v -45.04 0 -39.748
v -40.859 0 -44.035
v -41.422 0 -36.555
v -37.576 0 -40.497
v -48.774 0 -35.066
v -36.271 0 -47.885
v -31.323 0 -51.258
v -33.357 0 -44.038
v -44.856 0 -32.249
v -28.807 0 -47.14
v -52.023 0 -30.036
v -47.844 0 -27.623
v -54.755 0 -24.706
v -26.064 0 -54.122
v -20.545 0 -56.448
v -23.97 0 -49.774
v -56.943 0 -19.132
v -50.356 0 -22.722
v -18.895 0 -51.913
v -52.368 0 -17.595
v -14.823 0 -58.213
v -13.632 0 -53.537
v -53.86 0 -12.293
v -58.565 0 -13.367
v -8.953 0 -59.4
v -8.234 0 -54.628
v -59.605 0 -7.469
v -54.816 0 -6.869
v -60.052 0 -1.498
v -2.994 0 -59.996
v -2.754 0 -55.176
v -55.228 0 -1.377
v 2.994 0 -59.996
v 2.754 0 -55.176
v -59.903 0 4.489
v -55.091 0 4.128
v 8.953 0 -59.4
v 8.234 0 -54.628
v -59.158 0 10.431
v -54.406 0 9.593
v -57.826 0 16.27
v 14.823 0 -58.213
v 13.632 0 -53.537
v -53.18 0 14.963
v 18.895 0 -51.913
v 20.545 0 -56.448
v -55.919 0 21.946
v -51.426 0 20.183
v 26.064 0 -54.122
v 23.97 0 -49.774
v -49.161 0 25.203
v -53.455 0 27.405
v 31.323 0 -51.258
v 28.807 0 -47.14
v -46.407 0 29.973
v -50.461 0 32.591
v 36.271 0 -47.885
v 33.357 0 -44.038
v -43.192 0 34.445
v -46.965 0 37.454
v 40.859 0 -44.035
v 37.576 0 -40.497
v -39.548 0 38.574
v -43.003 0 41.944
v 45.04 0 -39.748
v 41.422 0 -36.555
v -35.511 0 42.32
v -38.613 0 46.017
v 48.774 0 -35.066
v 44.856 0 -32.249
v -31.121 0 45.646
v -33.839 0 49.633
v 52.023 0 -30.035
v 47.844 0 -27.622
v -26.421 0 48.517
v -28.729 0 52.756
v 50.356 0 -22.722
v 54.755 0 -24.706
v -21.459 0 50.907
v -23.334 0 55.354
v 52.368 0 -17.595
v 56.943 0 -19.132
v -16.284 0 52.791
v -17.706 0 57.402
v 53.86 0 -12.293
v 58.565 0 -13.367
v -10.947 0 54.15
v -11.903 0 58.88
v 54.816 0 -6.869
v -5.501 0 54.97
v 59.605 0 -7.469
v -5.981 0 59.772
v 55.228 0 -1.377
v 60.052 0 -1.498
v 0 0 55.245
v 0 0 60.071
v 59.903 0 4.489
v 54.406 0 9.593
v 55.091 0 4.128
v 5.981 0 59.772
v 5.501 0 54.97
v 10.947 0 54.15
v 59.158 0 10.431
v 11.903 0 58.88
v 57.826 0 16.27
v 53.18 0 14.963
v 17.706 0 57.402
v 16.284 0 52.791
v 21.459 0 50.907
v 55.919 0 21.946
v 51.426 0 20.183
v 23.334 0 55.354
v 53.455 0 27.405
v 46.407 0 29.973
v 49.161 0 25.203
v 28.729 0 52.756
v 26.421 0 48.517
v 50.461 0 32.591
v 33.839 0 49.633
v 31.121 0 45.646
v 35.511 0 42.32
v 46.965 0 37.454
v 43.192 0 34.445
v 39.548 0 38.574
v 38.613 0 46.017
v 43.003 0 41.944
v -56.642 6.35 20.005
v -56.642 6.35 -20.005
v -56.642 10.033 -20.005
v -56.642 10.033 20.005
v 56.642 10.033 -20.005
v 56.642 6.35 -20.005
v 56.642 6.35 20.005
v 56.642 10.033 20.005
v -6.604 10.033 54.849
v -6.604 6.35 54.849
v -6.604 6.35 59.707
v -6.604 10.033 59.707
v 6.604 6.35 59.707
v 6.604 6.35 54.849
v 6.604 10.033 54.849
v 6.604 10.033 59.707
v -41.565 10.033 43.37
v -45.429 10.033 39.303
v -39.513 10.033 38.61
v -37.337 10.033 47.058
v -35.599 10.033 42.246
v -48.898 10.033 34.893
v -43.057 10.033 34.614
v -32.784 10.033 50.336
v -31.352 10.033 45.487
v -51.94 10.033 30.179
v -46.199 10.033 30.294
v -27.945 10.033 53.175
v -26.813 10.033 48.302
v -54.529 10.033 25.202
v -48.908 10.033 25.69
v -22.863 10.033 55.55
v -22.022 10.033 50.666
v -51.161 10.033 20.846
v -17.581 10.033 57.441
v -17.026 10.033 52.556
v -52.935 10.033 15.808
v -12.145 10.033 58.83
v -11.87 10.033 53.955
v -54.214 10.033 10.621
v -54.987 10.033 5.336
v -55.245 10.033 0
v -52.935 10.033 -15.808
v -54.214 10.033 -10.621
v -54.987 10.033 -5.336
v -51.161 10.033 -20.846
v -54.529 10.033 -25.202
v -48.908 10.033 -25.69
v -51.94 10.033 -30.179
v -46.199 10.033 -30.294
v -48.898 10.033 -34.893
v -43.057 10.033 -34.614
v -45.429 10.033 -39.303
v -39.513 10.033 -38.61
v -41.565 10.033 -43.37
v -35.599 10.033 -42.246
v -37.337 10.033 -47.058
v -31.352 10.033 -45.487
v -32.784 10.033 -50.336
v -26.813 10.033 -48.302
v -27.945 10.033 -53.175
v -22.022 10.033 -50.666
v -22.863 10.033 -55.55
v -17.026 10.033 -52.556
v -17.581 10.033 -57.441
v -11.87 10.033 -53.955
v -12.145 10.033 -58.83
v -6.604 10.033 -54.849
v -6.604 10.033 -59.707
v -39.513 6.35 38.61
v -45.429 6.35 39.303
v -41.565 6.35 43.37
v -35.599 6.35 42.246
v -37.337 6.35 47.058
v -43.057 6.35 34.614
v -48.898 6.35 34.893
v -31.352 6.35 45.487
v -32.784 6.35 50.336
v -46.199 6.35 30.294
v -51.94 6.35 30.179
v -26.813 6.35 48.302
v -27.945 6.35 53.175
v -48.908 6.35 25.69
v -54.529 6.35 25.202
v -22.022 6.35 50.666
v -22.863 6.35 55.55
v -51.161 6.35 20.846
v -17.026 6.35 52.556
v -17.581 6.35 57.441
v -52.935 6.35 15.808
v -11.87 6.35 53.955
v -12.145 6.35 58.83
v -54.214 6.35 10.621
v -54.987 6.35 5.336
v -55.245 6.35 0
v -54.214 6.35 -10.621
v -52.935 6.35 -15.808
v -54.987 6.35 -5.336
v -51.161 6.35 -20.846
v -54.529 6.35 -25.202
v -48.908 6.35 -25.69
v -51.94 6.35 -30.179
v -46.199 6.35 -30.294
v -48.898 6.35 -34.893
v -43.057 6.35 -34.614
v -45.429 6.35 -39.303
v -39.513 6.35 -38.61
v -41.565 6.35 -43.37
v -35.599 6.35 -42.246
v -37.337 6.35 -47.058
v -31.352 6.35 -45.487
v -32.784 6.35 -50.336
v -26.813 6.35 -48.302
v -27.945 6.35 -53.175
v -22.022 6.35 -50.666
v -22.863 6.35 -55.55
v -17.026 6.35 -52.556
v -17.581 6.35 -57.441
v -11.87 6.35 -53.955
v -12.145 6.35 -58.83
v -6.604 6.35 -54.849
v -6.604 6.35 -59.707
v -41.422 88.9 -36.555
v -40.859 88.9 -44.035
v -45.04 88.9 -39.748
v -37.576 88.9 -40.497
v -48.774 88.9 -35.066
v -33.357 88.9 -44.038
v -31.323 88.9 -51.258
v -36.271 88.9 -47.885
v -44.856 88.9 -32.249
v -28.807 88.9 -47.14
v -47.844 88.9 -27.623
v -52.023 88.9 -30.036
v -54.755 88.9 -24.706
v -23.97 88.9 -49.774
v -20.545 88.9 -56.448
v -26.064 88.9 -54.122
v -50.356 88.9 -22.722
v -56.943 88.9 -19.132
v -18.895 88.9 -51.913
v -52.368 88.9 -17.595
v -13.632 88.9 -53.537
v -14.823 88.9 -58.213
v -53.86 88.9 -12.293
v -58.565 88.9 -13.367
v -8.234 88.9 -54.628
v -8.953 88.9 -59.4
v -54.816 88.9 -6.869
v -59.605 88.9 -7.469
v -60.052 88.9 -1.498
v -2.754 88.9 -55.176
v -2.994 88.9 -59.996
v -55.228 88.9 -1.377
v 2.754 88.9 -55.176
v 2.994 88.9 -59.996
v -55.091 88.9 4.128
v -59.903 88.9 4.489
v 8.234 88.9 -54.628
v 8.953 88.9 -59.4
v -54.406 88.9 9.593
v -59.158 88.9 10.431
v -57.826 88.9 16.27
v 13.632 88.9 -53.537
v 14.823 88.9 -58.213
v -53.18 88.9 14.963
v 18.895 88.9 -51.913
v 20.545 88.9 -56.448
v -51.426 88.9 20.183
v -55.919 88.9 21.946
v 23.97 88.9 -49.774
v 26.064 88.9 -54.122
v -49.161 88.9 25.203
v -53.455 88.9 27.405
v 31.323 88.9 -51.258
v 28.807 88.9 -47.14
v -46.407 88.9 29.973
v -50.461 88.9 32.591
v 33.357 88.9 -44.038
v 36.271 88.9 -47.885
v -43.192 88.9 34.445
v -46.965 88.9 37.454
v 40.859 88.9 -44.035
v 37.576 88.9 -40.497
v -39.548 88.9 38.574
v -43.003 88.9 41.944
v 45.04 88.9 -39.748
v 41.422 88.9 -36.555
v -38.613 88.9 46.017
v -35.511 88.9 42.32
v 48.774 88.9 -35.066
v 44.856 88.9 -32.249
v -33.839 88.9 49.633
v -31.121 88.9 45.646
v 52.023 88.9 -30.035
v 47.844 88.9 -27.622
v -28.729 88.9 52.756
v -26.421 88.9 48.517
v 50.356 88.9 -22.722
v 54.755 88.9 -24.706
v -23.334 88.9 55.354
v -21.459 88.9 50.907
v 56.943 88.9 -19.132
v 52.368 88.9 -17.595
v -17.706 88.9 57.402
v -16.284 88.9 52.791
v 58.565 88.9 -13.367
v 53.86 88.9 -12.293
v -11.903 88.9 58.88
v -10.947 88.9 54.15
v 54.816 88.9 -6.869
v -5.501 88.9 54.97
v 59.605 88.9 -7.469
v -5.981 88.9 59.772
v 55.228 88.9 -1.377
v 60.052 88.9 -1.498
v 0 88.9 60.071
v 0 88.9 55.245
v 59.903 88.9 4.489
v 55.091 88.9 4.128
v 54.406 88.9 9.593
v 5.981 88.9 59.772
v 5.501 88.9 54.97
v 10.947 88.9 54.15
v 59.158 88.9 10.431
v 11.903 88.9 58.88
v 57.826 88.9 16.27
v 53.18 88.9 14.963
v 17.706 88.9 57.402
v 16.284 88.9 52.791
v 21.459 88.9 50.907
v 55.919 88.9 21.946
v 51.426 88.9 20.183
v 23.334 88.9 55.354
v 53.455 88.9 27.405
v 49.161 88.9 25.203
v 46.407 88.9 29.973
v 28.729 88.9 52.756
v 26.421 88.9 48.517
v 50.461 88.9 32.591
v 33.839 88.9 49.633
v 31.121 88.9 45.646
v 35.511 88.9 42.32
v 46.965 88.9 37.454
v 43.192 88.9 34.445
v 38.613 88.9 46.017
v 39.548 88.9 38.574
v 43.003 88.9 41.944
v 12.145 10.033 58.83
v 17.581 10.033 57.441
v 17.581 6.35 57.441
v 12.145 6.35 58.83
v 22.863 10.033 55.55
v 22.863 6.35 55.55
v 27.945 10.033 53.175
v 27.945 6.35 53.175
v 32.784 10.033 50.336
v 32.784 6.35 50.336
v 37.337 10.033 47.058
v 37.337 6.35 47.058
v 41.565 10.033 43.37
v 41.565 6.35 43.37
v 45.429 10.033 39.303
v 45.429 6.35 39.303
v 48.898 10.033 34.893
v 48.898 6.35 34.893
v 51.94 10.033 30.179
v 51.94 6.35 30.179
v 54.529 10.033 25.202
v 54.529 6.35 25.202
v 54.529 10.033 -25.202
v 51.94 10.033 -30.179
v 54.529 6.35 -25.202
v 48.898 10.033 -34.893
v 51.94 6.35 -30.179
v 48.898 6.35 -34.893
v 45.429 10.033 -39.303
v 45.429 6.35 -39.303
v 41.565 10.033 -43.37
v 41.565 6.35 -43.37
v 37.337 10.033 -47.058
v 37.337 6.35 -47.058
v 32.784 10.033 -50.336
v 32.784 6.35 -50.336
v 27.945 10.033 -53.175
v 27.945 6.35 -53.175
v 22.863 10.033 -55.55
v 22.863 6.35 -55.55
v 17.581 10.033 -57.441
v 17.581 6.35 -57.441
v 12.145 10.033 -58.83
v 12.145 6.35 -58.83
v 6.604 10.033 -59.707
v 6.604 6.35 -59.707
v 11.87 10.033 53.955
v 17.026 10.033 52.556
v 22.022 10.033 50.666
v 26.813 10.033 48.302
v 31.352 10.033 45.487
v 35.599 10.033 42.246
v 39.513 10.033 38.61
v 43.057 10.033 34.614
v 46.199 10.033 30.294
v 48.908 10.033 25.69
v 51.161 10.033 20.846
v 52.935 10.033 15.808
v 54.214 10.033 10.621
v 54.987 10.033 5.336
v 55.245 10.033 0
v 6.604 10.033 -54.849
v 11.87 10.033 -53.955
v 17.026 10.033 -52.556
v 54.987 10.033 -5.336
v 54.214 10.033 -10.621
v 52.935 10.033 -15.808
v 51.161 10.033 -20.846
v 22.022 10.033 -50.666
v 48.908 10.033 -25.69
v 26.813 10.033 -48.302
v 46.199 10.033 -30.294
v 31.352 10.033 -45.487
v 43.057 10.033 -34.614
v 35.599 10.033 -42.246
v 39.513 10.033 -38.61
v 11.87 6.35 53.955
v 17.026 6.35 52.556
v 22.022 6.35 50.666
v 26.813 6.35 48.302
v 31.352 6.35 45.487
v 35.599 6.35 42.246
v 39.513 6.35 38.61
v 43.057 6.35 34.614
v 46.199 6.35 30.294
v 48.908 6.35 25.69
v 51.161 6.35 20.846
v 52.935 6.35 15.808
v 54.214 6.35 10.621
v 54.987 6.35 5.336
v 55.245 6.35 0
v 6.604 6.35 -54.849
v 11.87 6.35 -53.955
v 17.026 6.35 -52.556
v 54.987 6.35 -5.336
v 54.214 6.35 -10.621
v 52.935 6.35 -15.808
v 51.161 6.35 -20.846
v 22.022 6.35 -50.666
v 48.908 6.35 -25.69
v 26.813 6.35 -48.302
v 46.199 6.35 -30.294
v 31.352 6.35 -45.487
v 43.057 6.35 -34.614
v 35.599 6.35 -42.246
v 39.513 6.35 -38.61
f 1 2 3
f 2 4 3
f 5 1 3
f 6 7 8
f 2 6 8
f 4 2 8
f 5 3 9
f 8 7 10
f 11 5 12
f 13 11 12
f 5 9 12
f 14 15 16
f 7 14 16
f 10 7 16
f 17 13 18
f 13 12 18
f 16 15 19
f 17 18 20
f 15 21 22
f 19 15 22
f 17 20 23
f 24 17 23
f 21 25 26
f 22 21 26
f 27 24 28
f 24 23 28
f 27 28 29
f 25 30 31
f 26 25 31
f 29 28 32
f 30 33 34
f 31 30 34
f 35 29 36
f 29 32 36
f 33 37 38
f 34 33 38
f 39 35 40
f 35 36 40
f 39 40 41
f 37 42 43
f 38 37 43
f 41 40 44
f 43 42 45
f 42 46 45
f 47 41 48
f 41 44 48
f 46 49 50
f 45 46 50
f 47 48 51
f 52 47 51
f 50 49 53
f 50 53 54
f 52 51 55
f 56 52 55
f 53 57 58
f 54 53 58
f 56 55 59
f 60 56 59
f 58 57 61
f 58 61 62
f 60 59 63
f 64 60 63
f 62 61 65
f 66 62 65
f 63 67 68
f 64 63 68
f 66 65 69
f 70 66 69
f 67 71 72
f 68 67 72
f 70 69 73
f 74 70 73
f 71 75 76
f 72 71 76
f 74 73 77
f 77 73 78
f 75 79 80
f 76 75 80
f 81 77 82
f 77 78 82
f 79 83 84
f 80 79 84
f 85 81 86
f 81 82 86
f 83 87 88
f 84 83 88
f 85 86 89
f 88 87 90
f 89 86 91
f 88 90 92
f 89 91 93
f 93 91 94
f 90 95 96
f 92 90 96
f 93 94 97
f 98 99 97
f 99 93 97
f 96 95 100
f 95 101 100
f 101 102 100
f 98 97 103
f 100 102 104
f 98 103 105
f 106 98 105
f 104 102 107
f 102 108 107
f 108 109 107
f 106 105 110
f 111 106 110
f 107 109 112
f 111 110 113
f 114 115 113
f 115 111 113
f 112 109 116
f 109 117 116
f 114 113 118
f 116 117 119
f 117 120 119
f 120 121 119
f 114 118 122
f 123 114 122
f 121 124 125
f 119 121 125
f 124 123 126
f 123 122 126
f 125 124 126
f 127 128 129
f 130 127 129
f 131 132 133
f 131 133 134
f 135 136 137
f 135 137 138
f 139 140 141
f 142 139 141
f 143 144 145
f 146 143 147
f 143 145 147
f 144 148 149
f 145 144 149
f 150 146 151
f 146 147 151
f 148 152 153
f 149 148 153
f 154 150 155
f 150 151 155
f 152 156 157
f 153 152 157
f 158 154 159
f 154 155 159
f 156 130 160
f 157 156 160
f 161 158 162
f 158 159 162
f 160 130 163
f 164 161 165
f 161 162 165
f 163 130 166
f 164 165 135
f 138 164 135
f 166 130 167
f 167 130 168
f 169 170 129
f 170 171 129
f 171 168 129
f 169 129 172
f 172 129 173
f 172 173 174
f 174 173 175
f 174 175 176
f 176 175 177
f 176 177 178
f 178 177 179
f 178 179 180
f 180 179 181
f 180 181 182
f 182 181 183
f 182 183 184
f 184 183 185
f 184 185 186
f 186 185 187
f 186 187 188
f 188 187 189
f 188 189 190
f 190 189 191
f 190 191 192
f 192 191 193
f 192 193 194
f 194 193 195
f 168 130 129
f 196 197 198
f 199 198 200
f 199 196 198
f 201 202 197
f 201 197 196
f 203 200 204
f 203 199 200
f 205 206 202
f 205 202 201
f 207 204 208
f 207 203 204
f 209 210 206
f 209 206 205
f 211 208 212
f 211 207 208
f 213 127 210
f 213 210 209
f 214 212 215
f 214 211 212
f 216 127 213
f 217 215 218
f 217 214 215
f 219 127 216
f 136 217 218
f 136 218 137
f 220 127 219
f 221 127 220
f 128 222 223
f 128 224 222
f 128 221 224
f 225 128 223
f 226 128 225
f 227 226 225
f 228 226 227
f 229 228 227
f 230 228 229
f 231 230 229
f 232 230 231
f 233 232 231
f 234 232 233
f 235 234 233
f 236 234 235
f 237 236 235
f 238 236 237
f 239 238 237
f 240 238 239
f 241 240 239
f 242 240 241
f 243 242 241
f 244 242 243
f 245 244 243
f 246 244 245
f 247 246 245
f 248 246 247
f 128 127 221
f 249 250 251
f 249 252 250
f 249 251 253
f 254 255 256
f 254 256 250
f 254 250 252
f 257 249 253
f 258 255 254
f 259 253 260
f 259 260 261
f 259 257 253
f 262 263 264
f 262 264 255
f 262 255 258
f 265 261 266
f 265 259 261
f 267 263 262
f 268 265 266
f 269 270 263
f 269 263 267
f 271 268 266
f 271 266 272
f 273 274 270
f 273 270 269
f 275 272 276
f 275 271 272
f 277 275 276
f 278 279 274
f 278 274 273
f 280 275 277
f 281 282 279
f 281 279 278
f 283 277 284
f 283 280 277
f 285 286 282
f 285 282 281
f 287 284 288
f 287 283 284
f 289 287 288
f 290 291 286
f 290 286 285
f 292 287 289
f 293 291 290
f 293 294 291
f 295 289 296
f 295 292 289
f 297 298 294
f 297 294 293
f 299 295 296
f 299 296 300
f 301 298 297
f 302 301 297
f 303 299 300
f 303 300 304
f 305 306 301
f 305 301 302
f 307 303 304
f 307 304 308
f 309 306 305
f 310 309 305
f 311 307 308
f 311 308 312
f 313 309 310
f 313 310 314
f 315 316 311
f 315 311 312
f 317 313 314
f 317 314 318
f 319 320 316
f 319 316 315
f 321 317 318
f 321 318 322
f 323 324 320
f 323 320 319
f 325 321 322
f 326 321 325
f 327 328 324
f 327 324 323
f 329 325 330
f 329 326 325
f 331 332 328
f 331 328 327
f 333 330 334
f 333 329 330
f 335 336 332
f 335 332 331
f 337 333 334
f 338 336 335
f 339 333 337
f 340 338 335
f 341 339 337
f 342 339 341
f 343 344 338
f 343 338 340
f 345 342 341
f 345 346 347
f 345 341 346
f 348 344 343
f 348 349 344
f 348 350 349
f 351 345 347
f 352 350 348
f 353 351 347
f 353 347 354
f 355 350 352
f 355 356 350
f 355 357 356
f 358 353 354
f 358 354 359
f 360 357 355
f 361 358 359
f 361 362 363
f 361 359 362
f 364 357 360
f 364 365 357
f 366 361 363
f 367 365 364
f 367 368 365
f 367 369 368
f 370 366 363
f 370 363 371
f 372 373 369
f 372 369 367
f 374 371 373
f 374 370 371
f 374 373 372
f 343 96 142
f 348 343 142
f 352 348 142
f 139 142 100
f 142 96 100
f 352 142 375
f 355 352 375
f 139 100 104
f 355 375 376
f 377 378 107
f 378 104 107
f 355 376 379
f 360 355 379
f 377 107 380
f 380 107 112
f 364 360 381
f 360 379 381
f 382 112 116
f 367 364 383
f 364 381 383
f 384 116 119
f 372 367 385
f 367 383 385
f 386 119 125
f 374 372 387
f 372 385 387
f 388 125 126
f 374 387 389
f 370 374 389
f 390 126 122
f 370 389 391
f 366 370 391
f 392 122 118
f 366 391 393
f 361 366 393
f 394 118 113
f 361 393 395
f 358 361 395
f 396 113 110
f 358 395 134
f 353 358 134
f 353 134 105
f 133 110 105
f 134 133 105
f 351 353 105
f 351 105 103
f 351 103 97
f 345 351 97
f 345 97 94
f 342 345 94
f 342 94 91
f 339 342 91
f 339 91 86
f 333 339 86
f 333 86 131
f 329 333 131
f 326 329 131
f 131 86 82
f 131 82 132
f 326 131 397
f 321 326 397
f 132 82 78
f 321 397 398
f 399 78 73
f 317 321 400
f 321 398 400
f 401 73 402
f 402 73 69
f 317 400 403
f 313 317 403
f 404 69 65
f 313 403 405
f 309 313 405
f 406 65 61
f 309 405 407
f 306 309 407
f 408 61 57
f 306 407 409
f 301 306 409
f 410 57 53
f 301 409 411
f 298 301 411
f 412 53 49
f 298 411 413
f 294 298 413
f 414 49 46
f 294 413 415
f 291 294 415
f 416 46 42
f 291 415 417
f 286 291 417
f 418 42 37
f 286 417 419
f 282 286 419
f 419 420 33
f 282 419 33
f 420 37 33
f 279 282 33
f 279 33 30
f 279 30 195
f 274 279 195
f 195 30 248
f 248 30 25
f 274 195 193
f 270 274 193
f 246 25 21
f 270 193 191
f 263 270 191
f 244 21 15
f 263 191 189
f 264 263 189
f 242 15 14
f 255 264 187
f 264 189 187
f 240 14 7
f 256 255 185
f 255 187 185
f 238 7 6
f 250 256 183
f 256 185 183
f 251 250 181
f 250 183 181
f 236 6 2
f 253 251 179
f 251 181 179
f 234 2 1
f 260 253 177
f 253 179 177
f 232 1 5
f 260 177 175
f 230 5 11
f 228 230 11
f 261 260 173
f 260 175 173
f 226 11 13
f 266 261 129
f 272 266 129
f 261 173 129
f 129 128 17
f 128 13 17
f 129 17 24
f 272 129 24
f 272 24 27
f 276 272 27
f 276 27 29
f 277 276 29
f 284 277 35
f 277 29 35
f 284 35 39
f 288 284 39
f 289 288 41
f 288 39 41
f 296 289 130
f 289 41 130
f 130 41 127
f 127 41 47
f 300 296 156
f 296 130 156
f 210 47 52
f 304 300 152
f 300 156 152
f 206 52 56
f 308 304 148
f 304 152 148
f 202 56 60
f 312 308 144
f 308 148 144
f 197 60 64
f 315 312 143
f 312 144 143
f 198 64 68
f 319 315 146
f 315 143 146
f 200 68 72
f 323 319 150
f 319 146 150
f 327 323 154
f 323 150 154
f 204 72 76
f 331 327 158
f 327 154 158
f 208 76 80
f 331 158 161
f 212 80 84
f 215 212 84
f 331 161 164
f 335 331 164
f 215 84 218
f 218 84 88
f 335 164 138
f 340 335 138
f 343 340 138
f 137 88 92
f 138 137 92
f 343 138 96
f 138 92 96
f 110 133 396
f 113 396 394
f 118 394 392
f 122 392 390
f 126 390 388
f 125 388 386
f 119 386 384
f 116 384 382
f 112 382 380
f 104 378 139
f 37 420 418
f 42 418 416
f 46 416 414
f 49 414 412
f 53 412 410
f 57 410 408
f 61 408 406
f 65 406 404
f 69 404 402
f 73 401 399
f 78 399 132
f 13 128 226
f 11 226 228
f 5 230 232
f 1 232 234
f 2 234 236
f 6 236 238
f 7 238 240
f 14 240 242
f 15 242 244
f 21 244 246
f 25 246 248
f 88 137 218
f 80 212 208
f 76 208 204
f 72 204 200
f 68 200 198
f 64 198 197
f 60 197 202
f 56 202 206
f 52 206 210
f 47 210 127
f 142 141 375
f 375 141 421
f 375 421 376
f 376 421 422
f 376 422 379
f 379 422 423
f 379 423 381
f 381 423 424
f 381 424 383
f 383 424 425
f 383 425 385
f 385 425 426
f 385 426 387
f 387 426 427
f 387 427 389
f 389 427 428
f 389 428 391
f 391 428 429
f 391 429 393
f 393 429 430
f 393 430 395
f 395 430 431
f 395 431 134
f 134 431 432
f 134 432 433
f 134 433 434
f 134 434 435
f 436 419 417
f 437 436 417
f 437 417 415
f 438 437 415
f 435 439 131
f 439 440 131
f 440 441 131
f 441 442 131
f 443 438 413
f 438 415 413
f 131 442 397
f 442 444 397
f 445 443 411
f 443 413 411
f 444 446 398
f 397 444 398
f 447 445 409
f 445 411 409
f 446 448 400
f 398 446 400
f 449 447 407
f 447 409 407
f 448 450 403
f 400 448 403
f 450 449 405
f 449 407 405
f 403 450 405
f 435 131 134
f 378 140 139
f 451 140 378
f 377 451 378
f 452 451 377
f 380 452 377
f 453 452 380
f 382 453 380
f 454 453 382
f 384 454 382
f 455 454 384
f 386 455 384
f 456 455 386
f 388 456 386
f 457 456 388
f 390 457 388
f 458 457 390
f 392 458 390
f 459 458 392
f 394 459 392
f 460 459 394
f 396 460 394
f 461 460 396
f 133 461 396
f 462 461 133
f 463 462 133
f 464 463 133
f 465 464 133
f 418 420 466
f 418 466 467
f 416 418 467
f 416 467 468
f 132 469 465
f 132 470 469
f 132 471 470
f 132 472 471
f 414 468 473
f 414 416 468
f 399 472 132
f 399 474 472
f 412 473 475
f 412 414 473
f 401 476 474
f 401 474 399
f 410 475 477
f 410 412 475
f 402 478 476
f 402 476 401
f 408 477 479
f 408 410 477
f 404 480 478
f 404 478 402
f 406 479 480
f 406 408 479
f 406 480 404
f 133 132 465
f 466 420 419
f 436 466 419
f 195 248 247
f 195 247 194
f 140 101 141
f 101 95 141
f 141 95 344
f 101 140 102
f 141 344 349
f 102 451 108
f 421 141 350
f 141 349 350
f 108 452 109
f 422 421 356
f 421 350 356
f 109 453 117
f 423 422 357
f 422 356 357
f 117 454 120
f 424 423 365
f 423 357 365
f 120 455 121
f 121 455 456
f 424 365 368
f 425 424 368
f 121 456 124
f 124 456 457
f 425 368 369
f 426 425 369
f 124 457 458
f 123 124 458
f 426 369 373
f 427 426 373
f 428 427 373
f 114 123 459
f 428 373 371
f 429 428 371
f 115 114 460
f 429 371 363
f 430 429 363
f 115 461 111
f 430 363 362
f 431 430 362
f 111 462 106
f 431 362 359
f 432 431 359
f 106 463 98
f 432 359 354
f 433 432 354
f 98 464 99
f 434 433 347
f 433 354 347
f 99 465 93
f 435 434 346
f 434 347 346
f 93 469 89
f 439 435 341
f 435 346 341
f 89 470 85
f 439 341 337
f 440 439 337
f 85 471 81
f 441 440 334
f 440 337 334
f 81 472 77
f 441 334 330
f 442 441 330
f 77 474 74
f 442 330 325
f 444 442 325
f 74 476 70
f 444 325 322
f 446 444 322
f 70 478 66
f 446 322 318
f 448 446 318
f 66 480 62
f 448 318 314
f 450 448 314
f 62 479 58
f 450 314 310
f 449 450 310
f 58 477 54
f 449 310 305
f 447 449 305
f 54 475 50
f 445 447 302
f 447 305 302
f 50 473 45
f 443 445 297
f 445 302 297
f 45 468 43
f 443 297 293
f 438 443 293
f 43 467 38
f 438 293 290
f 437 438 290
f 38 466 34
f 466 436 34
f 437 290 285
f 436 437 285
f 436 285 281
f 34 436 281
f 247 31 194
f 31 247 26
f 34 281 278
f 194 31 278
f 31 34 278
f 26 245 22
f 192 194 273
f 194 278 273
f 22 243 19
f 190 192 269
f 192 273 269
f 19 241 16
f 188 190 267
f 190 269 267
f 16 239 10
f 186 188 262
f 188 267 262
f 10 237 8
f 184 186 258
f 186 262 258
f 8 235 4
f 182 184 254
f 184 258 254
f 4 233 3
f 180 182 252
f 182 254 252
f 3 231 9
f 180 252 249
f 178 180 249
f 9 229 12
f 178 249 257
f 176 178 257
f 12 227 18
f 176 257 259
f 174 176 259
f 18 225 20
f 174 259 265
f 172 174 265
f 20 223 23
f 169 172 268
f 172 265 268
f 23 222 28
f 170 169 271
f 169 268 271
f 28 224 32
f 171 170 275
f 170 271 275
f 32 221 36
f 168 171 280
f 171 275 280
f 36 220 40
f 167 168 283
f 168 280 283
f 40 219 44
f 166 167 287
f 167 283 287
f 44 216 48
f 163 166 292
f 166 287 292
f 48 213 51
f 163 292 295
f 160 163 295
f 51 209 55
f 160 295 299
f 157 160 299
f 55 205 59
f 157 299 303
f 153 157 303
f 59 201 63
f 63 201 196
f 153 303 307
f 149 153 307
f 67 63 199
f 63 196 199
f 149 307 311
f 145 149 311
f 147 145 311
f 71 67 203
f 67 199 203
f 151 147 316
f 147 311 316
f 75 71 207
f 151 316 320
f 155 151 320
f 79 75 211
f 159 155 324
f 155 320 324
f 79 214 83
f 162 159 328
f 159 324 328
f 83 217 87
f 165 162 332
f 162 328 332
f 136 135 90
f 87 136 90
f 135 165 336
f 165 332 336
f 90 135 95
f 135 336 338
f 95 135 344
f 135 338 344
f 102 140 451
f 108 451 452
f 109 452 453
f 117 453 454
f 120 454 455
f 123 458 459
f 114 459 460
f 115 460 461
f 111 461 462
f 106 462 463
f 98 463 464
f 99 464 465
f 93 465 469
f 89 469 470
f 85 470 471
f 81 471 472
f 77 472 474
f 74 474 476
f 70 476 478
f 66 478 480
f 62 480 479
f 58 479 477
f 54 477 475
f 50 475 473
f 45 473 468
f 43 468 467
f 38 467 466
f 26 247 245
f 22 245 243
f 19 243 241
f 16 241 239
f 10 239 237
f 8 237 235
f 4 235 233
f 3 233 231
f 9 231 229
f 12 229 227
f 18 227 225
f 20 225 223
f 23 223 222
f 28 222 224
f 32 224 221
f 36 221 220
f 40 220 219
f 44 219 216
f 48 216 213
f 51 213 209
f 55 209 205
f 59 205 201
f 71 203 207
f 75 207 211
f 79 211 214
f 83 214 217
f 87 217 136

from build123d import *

# Parameters (mm, degrees)
SKETCH1_R               = 60.071
BOSS_EXTRUDE1_DEPTH     = 88.9
SKETCH2_R               = 55.245
CUT_EXTRUDE1_DEPTH      = 123.964466745
CUT_EXTRUDE4_DEPTH      = 123.964466745
CUT_EXTRUDE4_DEPTH_BACK = 123.964466745
SKETCH6_W               = 50.038
SKETCH6_H               = 3.683


with BuildPart() as part:
    # Sketch1 → Boss-Extrude1 (new body)
    with BuildSketch(Plane(origin=(0, 0, 0), x_dir=(1, 0, 0), z_dir=(0, 1, 0))):
        with Locations(Location((0, 0, 0), (0, 0, 270))):
            Circle(SKETCH1_R)
    extrude(amount=BOSS_EXTRUDE1_DEPTH)

    # Sketch2 → Cut-Extrude1 (cut, through all)
    with BuildSketch(Plane(origin=(0, 88.9, 0), x_dir=(1, 0, 0), z_dir=(0, 1, 0))):
        with Locations(Location((0, 0, 0), (0, 0, 270))):
            Circle(SKETCH2_R)
    extrude(amount=-CUT_EXTRUDE1_DEPTH, mode=Mode.SUBTRACT)

    # Sketch6 → Cut-Extrude4 (cut, two sides: drawn at the far end of the back side and taken through both)
    with BuildSketch(Plane.XY.offset(-CUT_EXTRUDE4_DEPTH_BACK)):
        with Locations((-31.623, 8.1915)):
            Rectangle(SKETCH6_W, SKETCH6_H)
        with Locations((31.623, 8.1915)):
            Rectangle(SKETCH6_W, SKETCH6_H)
    extrude(amount=CUT_EXTRUDE4_DEPTH + CUT_EXTRUDE4_DEPTH_BACK, mode=Mode.SUBTRACT)


solid = part.part
